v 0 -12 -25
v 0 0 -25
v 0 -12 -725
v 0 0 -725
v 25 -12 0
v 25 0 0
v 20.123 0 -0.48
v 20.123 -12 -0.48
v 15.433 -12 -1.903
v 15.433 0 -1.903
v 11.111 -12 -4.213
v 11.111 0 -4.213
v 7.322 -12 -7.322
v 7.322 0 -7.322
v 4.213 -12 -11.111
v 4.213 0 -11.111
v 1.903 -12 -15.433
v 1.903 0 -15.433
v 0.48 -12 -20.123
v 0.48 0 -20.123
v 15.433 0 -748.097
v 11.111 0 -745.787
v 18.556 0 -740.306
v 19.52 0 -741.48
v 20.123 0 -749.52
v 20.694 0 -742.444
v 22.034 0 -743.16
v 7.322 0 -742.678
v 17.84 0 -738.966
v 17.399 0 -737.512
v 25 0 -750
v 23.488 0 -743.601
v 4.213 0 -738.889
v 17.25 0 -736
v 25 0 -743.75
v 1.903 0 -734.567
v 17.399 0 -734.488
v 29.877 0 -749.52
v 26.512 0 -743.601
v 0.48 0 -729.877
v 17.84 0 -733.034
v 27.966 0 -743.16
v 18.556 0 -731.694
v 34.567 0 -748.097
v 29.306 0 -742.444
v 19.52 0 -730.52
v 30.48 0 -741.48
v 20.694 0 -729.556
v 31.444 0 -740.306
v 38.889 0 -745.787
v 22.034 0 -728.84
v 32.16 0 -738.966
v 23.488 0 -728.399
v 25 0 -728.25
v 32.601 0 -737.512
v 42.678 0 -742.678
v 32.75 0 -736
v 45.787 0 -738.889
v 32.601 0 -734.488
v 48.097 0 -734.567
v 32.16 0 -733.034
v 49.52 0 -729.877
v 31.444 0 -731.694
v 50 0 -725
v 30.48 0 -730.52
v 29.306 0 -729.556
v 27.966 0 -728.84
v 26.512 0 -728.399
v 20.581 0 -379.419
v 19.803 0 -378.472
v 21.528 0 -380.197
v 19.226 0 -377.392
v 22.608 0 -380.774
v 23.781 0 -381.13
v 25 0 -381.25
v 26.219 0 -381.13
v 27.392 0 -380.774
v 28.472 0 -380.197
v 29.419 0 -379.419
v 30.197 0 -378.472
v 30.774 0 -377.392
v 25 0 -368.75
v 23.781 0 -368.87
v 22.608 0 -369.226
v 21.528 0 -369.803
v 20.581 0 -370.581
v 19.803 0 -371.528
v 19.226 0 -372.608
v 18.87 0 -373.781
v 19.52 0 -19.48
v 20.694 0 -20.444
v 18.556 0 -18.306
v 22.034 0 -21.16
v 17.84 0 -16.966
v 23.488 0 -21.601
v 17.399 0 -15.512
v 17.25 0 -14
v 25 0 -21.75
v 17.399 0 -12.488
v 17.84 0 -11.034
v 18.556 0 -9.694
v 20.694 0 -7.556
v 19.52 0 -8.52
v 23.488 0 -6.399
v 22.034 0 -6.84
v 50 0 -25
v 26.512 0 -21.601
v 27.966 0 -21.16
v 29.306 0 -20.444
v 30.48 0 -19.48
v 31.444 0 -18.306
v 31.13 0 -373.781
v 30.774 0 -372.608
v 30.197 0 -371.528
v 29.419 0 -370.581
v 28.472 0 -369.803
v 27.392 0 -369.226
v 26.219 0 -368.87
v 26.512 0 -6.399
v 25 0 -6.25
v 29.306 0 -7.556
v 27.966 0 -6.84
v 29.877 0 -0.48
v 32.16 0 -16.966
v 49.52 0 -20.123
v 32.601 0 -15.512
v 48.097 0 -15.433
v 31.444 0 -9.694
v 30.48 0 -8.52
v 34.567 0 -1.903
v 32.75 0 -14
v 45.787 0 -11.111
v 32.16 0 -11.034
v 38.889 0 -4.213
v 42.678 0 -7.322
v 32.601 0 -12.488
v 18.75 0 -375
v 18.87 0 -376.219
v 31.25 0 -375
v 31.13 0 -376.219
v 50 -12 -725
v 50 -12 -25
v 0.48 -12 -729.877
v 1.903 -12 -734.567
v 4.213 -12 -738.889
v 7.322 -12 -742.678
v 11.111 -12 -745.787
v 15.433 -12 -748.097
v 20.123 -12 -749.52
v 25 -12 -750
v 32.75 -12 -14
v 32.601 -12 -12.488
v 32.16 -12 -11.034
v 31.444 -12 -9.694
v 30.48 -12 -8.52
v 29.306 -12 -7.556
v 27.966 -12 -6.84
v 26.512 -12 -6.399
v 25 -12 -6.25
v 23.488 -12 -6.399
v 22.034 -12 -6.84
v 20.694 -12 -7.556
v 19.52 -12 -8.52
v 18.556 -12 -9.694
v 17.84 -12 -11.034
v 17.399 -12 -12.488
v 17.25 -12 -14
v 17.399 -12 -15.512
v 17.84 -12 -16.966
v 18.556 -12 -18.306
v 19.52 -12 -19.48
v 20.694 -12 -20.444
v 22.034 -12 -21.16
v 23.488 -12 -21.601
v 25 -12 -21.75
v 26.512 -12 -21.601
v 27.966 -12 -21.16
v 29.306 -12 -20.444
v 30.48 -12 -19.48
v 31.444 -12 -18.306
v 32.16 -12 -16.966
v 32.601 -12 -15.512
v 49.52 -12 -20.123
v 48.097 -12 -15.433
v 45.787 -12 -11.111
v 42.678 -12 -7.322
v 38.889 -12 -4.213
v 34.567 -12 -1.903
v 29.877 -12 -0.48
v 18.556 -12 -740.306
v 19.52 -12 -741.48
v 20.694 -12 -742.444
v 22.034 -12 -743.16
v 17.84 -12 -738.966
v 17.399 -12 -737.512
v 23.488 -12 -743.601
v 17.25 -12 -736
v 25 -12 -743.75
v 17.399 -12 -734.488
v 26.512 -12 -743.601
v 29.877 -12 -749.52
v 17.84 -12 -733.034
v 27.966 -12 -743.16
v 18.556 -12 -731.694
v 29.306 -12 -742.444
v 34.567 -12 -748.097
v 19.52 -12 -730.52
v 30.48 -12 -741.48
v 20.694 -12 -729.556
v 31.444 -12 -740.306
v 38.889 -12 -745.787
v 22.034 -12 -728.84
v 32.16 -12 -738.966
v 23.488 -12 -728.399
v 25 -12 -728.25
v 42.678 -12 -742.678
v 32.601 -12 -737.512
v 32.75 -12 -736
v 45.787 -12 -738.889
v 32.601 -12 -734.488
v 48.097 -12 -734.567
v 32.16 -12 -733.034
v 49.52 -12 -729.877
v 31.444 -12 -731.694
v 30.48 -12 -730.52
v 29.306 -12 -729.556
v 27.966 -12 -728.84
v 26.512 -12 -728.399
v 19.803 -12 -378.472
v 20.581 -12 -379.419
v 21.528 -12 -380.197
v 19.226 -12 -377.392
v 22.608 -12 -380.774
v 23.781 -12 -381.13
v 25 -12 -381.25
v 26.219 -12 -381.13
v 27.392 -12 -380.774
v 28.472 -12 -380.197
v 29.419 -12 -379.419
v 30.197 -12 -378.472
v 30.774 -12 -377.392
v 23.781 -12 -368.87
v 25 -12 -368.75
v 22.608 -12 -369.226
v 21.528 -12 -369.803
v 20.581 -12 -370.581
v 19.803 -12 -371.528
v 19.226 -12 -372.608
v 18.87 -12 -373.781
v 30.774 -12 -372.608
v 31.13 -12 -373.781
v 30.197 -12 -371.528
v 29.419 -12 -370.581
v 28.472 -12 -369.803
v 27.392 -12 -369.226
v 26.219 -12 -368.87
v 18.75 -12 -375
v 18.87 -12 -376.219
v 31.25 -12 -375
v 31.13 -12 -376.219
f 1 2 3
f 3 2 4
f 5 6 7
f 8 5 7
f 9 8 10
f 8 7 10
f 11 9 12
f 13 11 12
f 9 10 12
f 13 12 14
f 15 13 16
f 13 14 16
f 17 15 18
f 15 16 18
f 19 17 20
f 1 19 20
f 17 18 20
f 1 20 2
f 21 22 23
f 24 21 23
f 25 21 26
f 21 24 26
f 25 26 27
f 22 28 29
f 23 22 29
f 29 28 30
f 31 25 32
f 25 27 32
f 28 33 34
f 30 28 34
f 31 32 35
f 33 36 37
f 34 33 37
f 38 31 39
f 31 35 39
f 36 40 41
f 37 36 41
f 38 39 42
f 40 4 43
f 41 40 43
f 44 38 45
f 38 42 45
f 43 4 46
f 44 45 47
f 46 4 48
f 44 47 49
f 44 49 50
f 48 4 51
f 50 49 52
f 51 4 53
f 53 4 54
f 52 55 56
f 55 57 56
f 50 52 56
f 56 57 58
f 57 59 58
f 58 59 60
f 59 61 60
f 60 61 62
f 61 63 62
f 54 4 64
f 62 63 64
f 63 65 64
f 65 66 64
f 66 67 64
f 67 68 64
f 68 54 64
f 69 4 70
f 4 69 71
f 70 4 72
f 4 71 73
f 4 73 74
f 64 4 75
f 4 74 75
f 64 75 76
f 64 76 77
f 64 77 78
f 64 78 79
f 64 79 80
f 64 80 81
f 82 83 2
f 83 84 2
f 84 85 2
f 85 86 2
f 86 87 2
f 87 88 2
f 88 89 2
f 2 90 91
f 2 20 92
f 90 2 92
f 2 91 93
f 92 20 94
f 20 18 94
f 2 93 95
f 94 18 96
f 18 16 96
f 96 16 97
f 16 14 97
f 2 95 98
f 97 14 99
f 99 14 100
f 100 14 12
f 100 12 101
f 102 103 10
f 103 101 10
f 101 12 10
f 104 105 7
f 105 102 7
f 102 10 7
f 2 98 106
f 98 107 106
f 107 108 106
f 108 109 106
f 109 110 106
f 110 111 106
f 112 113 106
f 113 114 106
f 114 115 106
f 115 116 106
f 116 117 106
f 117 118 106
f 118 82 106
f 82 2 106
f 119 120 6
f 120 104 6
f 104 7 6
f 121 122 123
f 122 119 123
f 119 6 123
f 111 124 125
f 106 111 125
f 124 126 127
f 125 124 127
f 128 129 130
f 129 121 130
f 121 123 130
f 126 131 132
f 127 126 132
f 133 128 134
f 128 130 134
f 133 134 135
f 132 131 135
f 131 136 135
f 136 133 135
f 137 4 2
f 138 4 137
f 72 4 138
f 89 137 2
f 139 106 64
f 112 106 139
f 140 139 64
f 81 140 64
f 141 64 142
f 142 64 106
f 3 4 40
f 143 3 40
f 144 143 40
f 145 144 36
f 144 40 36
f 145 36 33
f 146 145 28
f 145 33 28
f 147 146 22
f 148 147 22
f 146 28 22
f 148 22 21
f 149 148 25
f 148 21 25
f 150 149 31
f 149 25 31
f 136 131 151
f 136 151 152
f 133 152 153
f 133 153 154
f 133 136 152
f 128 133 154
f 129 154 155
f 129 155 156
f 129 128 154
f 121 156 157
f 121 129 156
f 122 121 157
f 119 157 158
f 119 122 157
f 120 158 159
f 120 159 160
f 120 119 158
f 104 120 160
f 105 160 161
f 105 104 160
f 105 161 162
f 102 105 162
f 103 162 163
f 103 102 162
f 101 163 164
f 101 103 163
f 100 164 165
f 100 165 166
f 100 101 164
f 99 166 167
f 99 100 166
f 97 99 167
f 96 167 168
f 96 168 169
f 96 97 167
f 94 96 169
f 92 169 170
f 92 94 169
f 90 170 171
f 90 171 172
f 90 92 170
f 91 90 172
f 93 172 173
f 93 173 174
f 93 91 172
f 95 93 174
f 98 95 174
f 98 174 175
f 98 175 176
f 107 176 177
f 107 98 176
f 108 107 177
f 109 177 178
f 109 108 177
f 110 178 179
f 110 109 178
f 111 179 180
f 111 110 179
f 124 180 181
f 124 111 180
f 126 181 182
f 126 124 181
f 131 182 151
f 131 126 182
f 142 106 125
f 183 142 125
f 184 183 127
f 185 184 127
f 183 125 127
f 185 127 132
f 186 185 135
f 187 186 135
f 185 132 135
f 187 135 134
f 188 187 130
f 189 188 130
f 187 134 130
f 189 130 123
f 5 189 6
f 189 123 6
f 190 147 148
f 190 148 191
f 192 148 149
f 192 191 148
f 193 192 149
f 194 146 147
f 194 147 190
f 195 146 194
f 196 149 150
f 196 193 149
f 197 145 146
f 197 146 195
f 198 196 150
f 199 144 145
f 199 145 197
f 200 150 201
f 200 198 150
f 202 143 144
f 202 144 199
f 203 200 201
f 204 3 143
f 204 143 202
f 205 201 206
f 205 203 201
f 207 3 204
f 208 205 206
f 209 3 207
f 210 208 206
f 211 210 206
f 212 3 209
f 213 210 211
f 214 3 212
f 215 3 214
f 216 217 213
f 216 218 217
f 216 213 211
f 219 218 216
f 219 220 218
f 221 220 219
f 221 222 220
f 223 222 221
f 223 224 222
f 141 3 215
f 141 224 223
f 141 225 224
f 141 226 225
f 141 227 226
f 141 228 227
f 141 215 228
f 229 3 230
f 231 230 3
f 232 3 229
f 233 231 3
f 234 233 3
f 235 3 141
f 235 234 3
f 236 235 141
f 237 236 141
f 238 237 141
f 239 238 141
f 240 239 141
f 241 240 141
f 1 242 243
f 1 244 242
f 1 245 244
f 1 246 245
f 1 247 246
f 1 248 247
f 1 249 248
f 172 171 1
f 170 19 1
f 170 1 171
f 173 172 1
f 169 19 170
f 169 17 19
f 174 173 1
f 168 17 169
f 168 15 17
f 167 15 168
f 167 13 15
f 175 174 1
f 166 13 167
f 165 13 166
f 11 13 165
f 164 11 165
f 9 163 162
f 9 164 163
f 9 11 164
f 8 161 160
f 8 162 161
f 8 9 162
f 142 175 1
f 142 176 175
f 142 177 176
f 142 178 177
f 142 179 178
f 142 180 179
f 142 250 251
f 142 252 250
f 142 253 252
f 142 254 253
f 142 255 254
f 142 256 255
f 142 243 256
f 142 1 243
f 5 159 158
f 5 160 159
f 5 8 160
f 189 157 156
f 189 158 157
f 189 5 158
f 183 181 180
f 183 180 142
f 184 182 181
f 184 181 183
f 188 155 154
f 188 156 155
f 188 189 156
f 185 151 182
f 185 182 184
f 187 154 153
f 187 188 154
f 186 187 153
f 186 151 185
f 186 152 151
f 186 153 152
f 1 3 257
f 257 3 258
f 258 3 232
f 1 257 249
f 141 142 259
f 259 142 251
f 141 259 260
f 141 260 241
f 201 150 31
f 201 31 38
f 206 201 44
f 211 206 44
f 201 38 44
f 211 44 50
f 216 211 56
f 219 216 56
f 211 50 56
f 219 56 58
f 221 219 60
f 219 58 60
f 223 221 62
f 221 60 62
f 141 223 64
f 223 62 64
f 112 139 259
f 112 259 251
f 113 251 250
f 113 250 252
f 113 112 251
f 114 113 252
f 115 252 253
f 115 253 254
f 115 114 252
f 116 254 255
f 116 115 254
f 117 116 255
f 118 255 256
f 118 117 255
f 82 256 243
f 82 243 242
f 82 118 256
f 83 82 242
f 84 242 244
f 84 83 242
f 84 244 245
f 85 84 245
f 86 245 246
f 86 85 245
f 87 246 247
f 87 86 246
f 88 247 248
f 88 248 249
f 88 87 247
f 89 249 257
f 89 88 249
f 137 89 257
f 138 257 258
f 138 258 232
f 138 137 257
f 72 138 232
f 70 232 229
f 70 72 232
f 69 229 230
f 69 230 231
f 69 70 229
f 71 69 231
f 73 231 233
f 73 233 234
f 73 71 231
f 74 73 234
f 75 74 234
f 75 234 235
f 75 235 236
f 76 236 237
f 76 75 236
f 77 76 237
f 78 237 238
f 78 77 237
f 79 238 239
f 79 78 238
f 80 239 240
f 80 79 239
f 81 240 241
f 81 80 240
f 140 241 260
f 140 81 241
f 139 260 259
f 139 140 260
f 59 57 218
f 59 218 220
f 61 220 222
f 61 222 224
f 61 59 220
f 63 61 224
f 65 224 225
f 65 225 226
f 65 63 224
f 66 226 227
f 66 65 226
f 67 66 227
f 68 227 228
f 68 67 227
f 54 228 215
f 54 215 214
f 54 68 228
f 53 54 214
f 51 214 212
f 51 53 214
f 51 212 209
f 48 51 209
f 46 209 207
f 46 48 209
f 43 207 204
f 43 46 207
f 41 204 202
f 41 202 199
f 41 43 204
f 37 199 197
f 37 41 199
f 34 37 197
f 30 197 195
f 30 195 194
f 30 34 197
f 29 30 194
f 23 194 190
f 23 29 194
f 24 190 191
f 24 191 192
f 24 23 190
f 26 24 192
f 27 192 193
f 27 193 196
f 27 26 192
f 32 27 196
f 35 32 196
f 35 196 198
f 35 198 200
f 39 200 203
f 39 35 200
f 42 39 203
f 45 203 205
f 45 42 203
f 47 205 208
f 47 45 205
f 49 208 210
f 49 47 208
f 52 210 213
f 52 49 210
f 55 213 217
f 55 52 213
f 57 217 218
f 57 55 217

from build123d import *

# Parameters (mm, degrees)
F0_R     = 6.25
F0_R_2   = 7.75
F1_DEPTH = 12


with BuildPart() as f1:
    # F0 (on Front) → F1 (new body)
    with BuildSketch(Plane.XZ):
        with BuildLine():
            Line((0, -25), (0, -725))
            Line((0, -725), (50, -725))
            Line((50, -725), (50, -25))
            ThreePointArc((50, -25), (42.67767, -7.32233), (25, 0))
            ThreePointArc((25, 0), (7.32233, -7.32233), (0, -25))
        make_face()
        with Locations((25, -375)):
            Circle(F0_R, mode=Mode.SUBTRACT)
        with Locations((25, -14)):
            Circle(F0_R_2, mode=Mode.SUBTRACT)
        with BuildLine():
            Line((50, -725), (0, -725))
            ThreePointArc((0, -725), (7.32233, -742.67767), (25, -750))
            ThreePointArc((25, -750), (42.67767, -742.67767), (50, -725))
        make_face()
        with Locations((25, -736)):
            Circle(F0_R_2, mode=Mode.SUBTRACT)
    extrude(amount=F1_DEPTH)


solid = f1.part
